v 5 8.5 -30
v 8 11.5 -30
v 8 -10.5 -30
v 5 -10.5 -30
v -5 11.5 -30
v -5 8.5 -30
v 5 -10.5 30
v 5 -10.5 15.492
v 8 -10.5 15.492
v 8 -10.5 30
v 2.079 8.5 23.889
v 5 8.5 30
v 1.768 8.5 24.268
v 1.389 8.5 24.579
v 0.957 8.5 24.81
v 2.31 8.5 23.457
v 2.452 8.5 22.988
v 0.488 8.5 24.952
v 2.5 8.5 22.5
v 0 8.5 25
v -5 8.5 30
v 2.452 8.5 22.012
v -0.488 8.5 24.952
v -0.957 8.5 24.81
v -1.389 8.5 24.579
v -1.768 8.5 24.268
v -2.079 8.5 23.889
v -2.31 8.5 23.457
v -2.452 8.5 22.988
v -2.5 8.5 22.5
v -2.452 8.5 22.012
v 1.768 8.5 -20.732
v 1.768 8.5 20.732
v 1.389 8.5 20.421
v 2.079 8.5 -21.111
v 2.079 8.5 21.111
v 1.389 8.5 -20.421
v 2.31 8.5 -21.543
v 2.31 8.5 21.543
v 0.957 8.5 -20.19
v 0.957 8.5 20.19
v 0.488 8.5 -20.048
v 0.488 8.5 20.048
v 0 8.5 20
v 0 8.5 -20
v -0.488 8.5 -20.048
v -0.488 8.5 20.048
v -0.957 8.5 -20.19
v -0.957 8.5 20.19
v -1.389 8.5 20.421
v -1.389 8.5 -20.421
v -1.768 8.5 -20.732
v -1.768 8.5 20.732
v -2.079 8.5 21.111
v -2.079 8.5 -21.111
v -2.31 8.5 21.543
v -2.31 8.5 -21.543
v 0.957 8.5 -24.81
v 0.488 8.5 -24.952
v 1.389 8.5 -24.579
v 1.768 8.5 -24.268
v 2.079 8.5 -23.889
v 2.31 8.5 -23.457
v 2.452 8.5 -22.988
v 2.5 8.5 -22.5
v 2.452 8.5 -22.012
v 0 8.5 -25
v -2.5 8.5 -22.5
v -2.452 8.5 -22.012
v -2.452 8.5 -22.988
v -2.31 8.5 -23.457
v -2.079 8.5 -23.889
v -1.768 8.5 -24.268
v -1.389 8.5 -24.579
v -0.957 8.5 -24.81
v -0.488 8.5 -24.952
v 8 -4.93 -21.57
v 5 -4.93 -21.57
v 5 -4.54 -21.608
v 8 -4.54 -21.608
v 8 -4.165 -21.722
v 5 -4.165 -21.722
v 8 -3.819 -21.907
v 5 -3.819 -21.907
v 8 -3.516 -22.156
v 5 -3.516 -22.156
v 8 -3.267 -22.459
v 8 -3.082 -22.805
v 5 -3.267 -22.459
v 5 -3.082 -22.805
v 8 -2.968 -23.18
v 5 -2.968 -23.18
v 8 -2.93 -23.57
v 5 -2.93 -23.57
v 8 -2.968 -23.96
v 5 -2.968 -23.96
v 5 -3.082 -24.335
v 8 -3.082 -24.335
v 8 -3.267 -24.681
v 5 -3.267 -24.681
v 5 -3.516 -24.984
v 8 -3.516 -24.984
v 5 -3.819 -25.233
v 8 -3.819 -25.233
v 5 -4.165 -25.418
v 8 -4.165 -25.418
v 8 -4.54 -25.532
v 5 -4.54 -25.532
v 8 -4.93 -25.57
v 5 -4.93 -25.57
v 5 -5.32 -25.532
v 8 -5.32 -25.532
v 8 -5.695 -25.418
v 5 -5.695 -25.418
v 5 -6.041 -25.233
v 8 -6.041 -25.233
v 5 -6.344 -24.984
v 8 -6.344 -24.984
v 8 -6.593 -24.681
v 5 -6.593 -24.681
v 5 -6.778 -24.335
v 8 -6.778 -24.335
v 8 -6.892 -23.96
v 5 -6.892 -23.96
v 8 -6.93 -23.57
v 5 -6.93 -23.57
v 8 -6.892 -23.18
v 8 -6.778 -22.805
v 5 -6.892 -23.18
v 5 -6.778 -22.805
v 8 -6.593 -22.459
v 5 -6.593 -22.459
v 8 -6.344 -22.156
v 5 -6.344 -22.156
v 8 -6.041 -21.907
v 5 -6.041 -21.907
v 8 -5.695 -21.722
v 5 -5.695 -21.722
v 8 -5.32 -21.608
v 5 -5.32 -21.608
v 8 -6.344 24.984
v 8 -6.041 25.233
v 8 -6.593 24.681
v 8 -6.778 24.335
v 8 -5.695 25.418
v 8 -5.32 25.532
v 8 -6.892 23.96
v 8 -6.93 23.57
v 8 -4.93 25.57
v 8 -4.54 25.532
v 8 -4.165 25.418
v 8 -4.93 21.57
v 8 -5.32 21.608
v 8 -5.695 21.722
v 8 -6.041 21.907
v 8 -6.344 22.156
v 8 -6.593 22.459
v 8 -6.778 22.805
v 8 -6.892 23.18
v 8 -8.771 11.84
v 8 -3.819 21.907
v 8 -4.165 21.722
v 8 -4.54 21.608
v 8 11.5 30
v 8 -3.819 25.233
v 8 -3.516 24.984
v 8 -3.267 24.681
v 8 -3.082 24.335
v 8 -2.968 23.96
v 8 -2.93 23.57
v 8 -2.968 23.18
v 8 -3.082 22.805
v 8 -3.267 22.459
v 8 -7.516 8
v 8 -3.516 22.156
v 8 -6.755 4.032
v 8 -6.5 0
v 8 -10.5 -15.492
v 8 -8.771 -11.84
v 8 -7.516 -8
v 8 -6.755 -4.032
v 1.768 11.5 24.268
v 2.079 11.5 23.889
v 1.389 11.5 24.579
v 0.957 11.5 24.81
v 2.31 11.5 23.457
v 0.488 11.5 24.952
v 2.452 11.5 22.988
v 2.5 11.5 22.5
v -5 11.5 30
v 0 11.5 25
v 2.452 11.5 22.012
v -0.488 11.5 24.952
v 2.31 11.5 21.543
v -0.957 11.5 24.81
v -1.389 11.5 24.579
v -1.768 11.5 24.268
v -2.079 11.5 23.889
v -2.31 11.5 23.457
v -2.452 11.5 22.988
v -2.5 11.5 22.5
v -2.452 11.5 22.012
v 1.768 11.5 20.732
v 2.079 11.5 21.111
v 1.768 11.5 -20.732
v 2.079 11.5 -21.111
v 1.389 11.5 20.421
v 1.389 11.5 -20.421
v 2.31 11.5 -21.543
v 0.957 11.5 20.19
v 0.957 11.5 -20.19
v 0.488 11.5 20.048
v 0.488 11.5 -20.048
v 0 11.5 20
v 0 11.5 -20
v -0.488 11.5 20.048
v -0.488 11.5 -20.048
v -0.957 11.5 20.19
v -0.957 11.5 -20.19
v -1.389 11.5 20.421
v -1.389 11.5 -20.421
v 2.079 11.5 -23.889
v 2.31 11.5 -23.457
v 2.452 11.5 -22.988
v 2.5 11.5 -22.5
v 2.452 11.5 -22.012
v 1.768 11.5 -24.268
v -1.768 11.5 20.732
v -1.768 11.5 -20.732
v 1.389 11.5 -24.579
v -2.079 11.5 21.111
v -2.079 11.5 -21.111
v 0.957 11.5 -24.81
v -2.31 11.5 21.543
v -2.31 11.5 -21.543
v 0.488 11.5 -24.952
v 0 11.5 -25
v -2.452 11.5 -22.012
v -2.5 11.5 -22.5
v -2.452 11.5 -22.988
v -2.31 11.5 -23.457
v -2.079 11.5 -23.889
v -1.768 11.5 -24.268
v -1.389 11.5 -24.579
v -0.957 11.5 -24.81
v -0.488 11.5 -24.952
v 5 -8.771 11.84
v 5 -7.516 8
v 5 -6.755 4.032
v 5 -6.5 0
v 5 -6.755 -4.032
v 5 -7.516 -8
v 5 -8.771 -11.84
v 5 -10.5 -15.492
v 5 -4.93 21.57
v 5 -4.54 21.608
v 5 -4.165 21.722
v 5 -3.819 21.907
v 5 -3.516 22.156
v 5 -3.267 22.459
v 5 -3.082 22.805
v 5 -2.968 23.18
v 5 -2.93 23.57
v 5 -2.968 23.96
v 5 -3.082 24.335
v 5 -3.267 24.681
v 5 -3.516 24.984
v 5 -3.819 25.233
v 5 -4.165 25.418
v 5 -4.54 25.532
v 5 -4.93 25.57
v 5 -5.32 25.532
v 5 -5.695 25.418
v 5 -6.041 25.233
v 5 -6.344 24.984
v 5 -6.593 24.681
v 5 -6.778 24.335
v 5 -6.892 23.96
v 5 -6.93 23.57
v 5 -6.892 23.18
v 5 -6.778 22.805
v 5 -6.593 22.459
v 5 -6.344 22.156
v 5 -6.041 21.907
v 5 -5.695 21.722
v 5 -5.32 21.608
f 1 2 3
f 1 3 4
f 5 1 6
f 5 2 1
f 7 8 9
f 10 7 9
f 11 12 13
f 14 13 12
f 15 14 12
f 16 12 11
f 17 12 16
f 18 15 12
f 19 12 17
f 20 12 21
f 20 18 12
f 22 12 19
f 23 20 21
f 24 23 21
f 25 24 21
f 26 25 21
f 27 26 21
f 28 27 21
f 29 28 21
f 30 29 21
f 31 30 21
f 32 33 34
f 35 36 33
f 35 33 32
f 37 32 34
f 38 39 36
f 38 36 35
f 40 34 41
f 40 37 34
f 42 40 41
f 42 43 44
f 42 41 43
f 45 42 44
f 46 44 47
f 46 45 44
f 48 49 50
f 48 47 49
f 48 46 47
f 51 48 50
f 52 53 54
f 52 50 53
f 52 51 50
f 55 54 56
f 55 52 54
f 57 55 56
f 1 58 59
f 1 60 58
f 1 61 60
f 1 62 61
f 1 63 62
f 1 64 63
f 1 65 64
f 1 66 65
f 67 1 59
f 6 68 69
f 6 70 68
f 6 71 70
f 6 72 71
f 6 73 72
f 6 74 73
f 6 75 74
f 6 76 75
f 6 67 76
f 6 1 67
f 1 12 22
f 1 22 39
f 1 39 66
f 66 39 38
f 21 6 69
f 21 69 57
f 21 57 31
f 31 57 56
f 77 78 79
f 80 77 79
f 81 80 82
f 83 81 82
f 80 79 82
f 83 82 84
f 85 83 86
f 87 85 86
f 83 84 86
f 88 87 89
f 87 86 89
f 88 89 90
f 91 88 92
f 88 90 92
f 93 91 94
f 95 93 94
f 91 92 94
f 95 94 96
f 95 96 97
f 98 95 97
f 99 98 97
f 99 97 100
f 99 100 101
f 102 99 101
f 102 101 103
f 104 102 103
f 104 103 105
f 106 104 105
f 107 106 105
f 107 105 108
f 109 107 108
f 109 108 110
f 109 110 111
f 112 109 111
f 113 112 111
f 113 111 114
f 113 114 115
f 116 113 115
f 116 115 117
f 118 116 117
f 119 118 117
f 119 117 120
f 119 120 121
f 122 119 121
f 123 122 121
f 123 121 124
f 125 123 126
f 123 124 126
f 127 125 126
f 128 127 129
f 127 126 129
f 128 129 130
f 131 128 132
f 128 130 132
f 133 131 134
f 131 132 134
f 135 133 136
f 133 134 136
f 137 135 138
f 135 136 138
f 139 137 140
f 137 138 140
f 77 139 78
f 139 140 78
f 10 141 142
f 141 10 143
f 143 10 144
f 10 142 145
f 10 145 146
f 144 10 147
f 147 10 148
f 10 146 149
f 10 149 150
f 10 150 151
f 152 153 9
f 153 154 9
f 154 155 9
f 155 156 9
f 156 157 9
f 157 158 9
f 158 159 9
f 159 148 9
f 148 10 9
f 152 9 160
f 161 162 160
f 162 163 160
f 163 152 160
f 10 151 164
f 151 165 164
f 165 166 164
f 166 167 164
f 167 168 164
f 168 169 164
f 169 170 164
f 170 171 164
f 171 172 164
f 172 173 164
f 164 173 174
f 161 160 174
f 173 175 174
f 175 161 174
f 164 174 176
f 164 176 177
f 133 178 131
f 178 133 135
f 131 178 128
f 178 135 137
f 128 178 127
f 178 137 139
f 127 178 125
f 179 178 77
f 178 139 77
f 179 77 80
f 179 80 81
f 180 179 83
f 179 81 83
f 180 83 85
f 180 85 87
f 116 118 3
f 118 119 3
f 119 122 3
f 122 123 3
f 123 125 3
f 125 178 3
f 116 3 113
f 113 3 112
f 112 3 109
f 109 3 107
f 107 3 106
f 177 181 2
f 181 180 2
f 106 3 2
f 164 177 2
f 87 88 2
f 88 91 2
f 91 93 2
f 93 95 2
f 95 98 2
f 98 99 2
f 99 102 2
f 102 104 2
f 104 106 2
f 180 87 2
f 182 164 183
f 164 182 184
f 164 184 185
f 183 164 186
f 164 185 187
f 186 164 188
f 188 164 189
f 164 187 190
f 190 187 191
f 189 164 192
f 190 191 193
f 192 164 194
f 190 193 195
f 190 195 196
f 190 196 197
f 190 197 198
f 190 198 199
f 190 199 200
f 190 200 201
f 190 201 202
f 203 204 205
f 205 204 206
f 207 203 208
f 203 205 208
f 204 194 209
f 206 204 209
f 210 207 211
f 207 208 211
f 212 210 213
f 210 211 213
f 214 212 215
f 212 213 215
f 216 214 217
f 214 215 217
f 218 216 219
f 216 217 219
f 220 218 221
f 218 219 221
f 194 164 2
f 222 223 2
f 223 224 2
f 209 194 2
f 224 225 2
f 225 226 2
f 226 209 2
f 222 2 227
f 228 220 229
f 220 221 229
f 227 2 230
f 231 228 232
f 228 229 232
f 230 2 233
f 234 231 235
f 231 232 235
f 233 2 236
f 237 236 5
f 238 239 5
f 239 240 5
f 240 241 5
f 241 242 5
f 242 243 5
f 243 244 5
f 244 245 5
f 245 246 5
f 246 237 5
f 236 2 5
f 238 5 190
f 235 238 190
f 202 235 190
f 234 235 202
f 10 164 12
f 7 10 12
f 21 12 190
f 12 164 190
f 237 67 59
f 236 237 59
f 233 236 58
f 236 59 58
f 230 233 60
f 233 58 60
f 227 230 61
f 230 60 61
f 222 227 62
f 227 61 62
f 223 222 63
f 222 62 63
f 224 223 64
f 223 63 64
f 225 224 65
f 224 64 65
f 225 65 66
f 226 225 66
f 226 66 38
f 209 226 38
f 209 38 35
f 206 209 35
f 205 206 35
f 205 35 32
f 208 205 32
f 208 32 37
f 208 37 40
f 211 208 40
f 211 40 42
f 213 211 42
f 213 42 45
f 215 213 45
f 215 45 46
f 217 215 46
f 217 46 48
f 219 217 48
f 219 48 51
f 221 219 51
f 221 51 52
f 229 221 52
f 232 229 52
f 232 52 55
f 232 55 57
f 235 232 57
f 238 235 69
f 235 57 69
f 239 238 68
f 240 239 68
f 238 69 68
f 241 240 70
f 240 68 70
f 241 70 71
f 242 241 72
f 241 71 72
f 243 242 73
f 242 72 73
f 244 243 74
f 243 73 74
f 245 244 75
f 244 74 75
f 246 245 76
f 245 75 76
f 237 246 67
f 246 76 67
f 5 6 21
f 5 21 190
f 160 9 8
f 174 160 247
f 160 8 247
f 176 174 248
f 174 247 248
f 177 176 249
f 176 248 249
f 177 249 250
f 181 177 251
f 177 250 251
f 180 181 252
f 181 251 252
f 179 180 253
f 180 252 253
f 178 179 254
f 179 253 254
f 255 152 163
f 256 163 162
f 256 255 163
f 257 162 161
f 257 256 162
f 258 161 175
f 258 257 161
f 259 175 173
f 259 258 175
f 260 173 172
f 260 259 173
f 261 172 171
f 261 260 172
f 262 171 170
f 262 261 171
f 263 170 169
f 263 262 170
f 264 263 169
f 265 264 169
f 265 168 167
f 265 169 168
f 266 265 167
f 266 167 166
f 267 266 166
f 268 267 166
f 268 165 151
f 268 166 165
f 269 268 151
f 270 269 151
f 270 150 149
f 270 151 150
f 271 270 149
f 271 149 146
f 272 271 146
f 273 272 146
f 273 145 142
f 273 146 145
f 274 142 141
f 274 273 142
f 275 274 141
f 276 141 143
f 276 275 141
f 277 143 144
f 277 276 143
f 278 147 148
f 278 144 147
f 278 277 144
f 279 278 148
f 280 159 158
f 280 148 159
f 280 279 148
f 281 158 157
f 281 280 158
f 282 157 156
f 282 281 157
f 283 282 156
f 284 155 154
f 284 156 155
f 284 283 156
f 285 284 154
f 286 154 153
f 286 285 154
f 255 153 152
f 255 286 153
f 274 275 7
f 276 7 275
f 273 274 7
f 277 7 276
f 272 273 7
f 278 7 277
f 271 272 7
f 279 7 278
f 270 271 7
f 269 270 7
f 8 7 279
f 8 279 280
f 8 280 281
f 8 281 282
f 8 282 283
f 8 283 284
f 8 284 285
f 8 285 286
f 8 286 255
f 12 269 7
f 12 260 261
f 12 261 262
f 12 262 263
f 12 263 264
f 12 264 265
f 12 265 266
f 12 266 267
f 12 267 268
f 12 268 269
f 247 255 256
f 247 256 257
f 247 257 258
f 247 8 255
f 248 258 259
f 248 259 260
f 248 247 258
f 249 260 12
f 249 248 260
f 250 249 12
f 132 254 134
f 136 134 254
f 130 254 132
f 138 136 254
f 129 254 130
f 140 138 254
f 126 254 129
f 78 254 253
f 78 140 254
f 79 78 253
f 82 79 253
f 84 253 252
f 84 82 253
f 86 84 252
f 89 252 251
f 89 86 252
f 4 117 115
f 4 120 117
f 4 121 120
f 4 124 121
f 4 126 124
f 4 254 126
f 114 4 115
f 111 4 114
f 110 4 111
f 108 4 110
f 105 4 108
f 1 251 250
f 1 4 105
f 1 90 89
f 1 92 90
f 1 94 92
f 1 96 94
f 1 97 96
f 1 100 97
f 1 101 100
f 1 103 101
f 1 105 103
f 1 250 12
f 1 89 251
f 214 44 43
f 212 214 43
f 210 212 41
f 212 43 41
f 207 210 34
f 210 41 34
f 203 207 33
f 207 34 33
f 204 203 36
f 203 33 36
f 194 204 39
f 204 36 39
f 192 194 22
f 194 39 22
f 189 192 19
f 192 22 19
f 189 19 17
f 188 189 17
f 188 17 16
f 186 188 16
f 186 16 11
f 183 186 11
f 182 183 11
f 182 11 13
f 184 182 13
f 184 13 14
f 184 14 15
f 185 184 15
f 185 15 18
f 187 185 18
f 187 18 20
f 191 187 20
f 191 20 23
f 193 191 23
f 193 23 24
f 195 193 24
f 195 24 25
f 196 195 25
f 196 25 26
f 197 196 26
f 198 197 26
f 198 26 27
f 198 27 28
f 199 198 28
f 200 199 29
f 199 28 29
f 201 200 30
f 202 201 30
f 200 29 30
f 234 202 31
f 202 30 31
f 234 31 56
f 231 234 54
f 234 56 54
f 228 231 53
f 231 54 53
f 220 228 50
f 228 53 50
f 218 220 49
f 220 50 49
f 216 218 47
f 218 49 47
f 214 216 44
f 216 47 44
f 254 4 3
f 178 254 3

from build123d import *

# Parameters (mm, degrees)
CROQUIS1_W              = 10
CROQUIS1_H              = 60
CROQUIS1_R              = 2.5
SALIENTE_EXTRUIR1_DEPTH = 1.5
CROQUIS2_W              = 3
CROQUIS2_H              = 60
SALIENTE_EXTRUIR2_DEPTH = 12
CROQUIS4_R              = 32
CORTAR_EXTRUIR2_DEPTH   = 34.320414163
SKETCH1_W               = 13
SKETCH1_H               = 10
BOSS_EXTRUDE1_DEPTH     = 60
SKETCH2_R               = 2.5
CUT_EXTRUDE1_DEPTH      = 34.109666262
SKETCH3_W               = 10
SKETCH3_H               = 8.5
CUT_EXTRUDE2_DEPTH      = 62.613716005
SKETCH4_R               = 2
CUT_EXTRUDE3_DEPTH      = 34.648922717


with BuildPart() as part:
    # Croquis1 → Saliente-Extruir1 (new body)
    with BuildSketch(Plane(origin=(0, 0, 0), x_dir=(1, 0, 0), z_dir=(0, 1, 0))):
        Rectangle(CROQUIS1_W, CROQUIS1_H)
        with Locations(Location((0, 22.5, 0), (0, 0, 270))):
            Circle(CROQUIS1_R, mode=Mode.SUBTRACT)
        with Locations(Location((0, -22.5, 0), (0, 0, 270))):
            Circle(CROQUIS1_R, mode=Mode.SUBTRACT)
    extrude(amount=SALIENTE_EXTRUIR1_DEPTH)

    # Croquis2 → Saliente-Extruir2 (add)
    with BuildSketch(Plane(origin=(0, 1.5, 0), x_dir=(1, 0, 0), z_dir=(0, 1, 0))):
        with Locations((6.5, 0)):
            Rectangle(CROQUIS2_W, CROQUIS2_H)
    extrude(amount=-SALIENTE_EXTRUIR2_DEPTH)

    # Croquis4 → Cortar-Extruir2 (cut, through all)
    with BuildSketch(Plane.ZY.offset(-5)):
        with Locations((0, -38.5)):
            Circle(CROQUIS4_R)
    extrude(amount=-CORTAR_EXTRUIR2_DEPTH, mode=Mode.SUBTRACT)

    # Sketch1 → Boss-Extrude1 (add)
    with BuildSketch(Plane(origin=(0, 0, -30), x_dir=(-1, 0, 0), z_dir=(0, 0, -1))):
        with Locations((-1.5, 6.5)):
            Rectangle(SKETCH1_W, SKETCH1_H)
    extrude(amount=-BOSS_EXTRUDE1_DEPTH)

    # Sketch2 → Cut-Extrude1 (cut, through all)
    with BuildSketch(Plane.XZ):
        with Locations(Location((0, -22.5, 0), (0, 0, 270))):
            Circle(SKETCH2_R)
        with Locations(Location((0, 22.5, 0), (0, 0, 270))):
            Circle(SKETCH2_R)
    extrude(amount=-CUT_EXTRUDE1_DEPTH, mode=Mode.SUBTRACT)

    # Sketch3 → Cut-Extrude2 (cut, through all)
    with BuildSketch(Plane(origin=(0, 0, -30), x_dir=(-1, 0, 0), z_dir=(0, 0, -1))):
        with Locations((0, 4.25)):
            Rectangle(SKETCH3_W, SKETCH3_H)
    extrude(amount=-CUT_EXTRUDE2_DEPTH, mode=Mode.SUBTRACT)

    # Sketch4 → Cut-Extrude3 (cut, through all)
    with BuildSketch(Plane.ZY.offset(-5)):
        with Locations((-23.57, -4.93)):
            Circle(SKETCH4_R)
    cut_extrude3 = extrude(amount=-CUT_EXTRUDE3_DEPTH, mode=Mode.SUBTRACT)

    # Mirror1: Cut-Extrude3 across plane
    add(cut_extrude3.mirror(Plane.XY), mode=Mode.SUBTRACT)


solid = part.part
